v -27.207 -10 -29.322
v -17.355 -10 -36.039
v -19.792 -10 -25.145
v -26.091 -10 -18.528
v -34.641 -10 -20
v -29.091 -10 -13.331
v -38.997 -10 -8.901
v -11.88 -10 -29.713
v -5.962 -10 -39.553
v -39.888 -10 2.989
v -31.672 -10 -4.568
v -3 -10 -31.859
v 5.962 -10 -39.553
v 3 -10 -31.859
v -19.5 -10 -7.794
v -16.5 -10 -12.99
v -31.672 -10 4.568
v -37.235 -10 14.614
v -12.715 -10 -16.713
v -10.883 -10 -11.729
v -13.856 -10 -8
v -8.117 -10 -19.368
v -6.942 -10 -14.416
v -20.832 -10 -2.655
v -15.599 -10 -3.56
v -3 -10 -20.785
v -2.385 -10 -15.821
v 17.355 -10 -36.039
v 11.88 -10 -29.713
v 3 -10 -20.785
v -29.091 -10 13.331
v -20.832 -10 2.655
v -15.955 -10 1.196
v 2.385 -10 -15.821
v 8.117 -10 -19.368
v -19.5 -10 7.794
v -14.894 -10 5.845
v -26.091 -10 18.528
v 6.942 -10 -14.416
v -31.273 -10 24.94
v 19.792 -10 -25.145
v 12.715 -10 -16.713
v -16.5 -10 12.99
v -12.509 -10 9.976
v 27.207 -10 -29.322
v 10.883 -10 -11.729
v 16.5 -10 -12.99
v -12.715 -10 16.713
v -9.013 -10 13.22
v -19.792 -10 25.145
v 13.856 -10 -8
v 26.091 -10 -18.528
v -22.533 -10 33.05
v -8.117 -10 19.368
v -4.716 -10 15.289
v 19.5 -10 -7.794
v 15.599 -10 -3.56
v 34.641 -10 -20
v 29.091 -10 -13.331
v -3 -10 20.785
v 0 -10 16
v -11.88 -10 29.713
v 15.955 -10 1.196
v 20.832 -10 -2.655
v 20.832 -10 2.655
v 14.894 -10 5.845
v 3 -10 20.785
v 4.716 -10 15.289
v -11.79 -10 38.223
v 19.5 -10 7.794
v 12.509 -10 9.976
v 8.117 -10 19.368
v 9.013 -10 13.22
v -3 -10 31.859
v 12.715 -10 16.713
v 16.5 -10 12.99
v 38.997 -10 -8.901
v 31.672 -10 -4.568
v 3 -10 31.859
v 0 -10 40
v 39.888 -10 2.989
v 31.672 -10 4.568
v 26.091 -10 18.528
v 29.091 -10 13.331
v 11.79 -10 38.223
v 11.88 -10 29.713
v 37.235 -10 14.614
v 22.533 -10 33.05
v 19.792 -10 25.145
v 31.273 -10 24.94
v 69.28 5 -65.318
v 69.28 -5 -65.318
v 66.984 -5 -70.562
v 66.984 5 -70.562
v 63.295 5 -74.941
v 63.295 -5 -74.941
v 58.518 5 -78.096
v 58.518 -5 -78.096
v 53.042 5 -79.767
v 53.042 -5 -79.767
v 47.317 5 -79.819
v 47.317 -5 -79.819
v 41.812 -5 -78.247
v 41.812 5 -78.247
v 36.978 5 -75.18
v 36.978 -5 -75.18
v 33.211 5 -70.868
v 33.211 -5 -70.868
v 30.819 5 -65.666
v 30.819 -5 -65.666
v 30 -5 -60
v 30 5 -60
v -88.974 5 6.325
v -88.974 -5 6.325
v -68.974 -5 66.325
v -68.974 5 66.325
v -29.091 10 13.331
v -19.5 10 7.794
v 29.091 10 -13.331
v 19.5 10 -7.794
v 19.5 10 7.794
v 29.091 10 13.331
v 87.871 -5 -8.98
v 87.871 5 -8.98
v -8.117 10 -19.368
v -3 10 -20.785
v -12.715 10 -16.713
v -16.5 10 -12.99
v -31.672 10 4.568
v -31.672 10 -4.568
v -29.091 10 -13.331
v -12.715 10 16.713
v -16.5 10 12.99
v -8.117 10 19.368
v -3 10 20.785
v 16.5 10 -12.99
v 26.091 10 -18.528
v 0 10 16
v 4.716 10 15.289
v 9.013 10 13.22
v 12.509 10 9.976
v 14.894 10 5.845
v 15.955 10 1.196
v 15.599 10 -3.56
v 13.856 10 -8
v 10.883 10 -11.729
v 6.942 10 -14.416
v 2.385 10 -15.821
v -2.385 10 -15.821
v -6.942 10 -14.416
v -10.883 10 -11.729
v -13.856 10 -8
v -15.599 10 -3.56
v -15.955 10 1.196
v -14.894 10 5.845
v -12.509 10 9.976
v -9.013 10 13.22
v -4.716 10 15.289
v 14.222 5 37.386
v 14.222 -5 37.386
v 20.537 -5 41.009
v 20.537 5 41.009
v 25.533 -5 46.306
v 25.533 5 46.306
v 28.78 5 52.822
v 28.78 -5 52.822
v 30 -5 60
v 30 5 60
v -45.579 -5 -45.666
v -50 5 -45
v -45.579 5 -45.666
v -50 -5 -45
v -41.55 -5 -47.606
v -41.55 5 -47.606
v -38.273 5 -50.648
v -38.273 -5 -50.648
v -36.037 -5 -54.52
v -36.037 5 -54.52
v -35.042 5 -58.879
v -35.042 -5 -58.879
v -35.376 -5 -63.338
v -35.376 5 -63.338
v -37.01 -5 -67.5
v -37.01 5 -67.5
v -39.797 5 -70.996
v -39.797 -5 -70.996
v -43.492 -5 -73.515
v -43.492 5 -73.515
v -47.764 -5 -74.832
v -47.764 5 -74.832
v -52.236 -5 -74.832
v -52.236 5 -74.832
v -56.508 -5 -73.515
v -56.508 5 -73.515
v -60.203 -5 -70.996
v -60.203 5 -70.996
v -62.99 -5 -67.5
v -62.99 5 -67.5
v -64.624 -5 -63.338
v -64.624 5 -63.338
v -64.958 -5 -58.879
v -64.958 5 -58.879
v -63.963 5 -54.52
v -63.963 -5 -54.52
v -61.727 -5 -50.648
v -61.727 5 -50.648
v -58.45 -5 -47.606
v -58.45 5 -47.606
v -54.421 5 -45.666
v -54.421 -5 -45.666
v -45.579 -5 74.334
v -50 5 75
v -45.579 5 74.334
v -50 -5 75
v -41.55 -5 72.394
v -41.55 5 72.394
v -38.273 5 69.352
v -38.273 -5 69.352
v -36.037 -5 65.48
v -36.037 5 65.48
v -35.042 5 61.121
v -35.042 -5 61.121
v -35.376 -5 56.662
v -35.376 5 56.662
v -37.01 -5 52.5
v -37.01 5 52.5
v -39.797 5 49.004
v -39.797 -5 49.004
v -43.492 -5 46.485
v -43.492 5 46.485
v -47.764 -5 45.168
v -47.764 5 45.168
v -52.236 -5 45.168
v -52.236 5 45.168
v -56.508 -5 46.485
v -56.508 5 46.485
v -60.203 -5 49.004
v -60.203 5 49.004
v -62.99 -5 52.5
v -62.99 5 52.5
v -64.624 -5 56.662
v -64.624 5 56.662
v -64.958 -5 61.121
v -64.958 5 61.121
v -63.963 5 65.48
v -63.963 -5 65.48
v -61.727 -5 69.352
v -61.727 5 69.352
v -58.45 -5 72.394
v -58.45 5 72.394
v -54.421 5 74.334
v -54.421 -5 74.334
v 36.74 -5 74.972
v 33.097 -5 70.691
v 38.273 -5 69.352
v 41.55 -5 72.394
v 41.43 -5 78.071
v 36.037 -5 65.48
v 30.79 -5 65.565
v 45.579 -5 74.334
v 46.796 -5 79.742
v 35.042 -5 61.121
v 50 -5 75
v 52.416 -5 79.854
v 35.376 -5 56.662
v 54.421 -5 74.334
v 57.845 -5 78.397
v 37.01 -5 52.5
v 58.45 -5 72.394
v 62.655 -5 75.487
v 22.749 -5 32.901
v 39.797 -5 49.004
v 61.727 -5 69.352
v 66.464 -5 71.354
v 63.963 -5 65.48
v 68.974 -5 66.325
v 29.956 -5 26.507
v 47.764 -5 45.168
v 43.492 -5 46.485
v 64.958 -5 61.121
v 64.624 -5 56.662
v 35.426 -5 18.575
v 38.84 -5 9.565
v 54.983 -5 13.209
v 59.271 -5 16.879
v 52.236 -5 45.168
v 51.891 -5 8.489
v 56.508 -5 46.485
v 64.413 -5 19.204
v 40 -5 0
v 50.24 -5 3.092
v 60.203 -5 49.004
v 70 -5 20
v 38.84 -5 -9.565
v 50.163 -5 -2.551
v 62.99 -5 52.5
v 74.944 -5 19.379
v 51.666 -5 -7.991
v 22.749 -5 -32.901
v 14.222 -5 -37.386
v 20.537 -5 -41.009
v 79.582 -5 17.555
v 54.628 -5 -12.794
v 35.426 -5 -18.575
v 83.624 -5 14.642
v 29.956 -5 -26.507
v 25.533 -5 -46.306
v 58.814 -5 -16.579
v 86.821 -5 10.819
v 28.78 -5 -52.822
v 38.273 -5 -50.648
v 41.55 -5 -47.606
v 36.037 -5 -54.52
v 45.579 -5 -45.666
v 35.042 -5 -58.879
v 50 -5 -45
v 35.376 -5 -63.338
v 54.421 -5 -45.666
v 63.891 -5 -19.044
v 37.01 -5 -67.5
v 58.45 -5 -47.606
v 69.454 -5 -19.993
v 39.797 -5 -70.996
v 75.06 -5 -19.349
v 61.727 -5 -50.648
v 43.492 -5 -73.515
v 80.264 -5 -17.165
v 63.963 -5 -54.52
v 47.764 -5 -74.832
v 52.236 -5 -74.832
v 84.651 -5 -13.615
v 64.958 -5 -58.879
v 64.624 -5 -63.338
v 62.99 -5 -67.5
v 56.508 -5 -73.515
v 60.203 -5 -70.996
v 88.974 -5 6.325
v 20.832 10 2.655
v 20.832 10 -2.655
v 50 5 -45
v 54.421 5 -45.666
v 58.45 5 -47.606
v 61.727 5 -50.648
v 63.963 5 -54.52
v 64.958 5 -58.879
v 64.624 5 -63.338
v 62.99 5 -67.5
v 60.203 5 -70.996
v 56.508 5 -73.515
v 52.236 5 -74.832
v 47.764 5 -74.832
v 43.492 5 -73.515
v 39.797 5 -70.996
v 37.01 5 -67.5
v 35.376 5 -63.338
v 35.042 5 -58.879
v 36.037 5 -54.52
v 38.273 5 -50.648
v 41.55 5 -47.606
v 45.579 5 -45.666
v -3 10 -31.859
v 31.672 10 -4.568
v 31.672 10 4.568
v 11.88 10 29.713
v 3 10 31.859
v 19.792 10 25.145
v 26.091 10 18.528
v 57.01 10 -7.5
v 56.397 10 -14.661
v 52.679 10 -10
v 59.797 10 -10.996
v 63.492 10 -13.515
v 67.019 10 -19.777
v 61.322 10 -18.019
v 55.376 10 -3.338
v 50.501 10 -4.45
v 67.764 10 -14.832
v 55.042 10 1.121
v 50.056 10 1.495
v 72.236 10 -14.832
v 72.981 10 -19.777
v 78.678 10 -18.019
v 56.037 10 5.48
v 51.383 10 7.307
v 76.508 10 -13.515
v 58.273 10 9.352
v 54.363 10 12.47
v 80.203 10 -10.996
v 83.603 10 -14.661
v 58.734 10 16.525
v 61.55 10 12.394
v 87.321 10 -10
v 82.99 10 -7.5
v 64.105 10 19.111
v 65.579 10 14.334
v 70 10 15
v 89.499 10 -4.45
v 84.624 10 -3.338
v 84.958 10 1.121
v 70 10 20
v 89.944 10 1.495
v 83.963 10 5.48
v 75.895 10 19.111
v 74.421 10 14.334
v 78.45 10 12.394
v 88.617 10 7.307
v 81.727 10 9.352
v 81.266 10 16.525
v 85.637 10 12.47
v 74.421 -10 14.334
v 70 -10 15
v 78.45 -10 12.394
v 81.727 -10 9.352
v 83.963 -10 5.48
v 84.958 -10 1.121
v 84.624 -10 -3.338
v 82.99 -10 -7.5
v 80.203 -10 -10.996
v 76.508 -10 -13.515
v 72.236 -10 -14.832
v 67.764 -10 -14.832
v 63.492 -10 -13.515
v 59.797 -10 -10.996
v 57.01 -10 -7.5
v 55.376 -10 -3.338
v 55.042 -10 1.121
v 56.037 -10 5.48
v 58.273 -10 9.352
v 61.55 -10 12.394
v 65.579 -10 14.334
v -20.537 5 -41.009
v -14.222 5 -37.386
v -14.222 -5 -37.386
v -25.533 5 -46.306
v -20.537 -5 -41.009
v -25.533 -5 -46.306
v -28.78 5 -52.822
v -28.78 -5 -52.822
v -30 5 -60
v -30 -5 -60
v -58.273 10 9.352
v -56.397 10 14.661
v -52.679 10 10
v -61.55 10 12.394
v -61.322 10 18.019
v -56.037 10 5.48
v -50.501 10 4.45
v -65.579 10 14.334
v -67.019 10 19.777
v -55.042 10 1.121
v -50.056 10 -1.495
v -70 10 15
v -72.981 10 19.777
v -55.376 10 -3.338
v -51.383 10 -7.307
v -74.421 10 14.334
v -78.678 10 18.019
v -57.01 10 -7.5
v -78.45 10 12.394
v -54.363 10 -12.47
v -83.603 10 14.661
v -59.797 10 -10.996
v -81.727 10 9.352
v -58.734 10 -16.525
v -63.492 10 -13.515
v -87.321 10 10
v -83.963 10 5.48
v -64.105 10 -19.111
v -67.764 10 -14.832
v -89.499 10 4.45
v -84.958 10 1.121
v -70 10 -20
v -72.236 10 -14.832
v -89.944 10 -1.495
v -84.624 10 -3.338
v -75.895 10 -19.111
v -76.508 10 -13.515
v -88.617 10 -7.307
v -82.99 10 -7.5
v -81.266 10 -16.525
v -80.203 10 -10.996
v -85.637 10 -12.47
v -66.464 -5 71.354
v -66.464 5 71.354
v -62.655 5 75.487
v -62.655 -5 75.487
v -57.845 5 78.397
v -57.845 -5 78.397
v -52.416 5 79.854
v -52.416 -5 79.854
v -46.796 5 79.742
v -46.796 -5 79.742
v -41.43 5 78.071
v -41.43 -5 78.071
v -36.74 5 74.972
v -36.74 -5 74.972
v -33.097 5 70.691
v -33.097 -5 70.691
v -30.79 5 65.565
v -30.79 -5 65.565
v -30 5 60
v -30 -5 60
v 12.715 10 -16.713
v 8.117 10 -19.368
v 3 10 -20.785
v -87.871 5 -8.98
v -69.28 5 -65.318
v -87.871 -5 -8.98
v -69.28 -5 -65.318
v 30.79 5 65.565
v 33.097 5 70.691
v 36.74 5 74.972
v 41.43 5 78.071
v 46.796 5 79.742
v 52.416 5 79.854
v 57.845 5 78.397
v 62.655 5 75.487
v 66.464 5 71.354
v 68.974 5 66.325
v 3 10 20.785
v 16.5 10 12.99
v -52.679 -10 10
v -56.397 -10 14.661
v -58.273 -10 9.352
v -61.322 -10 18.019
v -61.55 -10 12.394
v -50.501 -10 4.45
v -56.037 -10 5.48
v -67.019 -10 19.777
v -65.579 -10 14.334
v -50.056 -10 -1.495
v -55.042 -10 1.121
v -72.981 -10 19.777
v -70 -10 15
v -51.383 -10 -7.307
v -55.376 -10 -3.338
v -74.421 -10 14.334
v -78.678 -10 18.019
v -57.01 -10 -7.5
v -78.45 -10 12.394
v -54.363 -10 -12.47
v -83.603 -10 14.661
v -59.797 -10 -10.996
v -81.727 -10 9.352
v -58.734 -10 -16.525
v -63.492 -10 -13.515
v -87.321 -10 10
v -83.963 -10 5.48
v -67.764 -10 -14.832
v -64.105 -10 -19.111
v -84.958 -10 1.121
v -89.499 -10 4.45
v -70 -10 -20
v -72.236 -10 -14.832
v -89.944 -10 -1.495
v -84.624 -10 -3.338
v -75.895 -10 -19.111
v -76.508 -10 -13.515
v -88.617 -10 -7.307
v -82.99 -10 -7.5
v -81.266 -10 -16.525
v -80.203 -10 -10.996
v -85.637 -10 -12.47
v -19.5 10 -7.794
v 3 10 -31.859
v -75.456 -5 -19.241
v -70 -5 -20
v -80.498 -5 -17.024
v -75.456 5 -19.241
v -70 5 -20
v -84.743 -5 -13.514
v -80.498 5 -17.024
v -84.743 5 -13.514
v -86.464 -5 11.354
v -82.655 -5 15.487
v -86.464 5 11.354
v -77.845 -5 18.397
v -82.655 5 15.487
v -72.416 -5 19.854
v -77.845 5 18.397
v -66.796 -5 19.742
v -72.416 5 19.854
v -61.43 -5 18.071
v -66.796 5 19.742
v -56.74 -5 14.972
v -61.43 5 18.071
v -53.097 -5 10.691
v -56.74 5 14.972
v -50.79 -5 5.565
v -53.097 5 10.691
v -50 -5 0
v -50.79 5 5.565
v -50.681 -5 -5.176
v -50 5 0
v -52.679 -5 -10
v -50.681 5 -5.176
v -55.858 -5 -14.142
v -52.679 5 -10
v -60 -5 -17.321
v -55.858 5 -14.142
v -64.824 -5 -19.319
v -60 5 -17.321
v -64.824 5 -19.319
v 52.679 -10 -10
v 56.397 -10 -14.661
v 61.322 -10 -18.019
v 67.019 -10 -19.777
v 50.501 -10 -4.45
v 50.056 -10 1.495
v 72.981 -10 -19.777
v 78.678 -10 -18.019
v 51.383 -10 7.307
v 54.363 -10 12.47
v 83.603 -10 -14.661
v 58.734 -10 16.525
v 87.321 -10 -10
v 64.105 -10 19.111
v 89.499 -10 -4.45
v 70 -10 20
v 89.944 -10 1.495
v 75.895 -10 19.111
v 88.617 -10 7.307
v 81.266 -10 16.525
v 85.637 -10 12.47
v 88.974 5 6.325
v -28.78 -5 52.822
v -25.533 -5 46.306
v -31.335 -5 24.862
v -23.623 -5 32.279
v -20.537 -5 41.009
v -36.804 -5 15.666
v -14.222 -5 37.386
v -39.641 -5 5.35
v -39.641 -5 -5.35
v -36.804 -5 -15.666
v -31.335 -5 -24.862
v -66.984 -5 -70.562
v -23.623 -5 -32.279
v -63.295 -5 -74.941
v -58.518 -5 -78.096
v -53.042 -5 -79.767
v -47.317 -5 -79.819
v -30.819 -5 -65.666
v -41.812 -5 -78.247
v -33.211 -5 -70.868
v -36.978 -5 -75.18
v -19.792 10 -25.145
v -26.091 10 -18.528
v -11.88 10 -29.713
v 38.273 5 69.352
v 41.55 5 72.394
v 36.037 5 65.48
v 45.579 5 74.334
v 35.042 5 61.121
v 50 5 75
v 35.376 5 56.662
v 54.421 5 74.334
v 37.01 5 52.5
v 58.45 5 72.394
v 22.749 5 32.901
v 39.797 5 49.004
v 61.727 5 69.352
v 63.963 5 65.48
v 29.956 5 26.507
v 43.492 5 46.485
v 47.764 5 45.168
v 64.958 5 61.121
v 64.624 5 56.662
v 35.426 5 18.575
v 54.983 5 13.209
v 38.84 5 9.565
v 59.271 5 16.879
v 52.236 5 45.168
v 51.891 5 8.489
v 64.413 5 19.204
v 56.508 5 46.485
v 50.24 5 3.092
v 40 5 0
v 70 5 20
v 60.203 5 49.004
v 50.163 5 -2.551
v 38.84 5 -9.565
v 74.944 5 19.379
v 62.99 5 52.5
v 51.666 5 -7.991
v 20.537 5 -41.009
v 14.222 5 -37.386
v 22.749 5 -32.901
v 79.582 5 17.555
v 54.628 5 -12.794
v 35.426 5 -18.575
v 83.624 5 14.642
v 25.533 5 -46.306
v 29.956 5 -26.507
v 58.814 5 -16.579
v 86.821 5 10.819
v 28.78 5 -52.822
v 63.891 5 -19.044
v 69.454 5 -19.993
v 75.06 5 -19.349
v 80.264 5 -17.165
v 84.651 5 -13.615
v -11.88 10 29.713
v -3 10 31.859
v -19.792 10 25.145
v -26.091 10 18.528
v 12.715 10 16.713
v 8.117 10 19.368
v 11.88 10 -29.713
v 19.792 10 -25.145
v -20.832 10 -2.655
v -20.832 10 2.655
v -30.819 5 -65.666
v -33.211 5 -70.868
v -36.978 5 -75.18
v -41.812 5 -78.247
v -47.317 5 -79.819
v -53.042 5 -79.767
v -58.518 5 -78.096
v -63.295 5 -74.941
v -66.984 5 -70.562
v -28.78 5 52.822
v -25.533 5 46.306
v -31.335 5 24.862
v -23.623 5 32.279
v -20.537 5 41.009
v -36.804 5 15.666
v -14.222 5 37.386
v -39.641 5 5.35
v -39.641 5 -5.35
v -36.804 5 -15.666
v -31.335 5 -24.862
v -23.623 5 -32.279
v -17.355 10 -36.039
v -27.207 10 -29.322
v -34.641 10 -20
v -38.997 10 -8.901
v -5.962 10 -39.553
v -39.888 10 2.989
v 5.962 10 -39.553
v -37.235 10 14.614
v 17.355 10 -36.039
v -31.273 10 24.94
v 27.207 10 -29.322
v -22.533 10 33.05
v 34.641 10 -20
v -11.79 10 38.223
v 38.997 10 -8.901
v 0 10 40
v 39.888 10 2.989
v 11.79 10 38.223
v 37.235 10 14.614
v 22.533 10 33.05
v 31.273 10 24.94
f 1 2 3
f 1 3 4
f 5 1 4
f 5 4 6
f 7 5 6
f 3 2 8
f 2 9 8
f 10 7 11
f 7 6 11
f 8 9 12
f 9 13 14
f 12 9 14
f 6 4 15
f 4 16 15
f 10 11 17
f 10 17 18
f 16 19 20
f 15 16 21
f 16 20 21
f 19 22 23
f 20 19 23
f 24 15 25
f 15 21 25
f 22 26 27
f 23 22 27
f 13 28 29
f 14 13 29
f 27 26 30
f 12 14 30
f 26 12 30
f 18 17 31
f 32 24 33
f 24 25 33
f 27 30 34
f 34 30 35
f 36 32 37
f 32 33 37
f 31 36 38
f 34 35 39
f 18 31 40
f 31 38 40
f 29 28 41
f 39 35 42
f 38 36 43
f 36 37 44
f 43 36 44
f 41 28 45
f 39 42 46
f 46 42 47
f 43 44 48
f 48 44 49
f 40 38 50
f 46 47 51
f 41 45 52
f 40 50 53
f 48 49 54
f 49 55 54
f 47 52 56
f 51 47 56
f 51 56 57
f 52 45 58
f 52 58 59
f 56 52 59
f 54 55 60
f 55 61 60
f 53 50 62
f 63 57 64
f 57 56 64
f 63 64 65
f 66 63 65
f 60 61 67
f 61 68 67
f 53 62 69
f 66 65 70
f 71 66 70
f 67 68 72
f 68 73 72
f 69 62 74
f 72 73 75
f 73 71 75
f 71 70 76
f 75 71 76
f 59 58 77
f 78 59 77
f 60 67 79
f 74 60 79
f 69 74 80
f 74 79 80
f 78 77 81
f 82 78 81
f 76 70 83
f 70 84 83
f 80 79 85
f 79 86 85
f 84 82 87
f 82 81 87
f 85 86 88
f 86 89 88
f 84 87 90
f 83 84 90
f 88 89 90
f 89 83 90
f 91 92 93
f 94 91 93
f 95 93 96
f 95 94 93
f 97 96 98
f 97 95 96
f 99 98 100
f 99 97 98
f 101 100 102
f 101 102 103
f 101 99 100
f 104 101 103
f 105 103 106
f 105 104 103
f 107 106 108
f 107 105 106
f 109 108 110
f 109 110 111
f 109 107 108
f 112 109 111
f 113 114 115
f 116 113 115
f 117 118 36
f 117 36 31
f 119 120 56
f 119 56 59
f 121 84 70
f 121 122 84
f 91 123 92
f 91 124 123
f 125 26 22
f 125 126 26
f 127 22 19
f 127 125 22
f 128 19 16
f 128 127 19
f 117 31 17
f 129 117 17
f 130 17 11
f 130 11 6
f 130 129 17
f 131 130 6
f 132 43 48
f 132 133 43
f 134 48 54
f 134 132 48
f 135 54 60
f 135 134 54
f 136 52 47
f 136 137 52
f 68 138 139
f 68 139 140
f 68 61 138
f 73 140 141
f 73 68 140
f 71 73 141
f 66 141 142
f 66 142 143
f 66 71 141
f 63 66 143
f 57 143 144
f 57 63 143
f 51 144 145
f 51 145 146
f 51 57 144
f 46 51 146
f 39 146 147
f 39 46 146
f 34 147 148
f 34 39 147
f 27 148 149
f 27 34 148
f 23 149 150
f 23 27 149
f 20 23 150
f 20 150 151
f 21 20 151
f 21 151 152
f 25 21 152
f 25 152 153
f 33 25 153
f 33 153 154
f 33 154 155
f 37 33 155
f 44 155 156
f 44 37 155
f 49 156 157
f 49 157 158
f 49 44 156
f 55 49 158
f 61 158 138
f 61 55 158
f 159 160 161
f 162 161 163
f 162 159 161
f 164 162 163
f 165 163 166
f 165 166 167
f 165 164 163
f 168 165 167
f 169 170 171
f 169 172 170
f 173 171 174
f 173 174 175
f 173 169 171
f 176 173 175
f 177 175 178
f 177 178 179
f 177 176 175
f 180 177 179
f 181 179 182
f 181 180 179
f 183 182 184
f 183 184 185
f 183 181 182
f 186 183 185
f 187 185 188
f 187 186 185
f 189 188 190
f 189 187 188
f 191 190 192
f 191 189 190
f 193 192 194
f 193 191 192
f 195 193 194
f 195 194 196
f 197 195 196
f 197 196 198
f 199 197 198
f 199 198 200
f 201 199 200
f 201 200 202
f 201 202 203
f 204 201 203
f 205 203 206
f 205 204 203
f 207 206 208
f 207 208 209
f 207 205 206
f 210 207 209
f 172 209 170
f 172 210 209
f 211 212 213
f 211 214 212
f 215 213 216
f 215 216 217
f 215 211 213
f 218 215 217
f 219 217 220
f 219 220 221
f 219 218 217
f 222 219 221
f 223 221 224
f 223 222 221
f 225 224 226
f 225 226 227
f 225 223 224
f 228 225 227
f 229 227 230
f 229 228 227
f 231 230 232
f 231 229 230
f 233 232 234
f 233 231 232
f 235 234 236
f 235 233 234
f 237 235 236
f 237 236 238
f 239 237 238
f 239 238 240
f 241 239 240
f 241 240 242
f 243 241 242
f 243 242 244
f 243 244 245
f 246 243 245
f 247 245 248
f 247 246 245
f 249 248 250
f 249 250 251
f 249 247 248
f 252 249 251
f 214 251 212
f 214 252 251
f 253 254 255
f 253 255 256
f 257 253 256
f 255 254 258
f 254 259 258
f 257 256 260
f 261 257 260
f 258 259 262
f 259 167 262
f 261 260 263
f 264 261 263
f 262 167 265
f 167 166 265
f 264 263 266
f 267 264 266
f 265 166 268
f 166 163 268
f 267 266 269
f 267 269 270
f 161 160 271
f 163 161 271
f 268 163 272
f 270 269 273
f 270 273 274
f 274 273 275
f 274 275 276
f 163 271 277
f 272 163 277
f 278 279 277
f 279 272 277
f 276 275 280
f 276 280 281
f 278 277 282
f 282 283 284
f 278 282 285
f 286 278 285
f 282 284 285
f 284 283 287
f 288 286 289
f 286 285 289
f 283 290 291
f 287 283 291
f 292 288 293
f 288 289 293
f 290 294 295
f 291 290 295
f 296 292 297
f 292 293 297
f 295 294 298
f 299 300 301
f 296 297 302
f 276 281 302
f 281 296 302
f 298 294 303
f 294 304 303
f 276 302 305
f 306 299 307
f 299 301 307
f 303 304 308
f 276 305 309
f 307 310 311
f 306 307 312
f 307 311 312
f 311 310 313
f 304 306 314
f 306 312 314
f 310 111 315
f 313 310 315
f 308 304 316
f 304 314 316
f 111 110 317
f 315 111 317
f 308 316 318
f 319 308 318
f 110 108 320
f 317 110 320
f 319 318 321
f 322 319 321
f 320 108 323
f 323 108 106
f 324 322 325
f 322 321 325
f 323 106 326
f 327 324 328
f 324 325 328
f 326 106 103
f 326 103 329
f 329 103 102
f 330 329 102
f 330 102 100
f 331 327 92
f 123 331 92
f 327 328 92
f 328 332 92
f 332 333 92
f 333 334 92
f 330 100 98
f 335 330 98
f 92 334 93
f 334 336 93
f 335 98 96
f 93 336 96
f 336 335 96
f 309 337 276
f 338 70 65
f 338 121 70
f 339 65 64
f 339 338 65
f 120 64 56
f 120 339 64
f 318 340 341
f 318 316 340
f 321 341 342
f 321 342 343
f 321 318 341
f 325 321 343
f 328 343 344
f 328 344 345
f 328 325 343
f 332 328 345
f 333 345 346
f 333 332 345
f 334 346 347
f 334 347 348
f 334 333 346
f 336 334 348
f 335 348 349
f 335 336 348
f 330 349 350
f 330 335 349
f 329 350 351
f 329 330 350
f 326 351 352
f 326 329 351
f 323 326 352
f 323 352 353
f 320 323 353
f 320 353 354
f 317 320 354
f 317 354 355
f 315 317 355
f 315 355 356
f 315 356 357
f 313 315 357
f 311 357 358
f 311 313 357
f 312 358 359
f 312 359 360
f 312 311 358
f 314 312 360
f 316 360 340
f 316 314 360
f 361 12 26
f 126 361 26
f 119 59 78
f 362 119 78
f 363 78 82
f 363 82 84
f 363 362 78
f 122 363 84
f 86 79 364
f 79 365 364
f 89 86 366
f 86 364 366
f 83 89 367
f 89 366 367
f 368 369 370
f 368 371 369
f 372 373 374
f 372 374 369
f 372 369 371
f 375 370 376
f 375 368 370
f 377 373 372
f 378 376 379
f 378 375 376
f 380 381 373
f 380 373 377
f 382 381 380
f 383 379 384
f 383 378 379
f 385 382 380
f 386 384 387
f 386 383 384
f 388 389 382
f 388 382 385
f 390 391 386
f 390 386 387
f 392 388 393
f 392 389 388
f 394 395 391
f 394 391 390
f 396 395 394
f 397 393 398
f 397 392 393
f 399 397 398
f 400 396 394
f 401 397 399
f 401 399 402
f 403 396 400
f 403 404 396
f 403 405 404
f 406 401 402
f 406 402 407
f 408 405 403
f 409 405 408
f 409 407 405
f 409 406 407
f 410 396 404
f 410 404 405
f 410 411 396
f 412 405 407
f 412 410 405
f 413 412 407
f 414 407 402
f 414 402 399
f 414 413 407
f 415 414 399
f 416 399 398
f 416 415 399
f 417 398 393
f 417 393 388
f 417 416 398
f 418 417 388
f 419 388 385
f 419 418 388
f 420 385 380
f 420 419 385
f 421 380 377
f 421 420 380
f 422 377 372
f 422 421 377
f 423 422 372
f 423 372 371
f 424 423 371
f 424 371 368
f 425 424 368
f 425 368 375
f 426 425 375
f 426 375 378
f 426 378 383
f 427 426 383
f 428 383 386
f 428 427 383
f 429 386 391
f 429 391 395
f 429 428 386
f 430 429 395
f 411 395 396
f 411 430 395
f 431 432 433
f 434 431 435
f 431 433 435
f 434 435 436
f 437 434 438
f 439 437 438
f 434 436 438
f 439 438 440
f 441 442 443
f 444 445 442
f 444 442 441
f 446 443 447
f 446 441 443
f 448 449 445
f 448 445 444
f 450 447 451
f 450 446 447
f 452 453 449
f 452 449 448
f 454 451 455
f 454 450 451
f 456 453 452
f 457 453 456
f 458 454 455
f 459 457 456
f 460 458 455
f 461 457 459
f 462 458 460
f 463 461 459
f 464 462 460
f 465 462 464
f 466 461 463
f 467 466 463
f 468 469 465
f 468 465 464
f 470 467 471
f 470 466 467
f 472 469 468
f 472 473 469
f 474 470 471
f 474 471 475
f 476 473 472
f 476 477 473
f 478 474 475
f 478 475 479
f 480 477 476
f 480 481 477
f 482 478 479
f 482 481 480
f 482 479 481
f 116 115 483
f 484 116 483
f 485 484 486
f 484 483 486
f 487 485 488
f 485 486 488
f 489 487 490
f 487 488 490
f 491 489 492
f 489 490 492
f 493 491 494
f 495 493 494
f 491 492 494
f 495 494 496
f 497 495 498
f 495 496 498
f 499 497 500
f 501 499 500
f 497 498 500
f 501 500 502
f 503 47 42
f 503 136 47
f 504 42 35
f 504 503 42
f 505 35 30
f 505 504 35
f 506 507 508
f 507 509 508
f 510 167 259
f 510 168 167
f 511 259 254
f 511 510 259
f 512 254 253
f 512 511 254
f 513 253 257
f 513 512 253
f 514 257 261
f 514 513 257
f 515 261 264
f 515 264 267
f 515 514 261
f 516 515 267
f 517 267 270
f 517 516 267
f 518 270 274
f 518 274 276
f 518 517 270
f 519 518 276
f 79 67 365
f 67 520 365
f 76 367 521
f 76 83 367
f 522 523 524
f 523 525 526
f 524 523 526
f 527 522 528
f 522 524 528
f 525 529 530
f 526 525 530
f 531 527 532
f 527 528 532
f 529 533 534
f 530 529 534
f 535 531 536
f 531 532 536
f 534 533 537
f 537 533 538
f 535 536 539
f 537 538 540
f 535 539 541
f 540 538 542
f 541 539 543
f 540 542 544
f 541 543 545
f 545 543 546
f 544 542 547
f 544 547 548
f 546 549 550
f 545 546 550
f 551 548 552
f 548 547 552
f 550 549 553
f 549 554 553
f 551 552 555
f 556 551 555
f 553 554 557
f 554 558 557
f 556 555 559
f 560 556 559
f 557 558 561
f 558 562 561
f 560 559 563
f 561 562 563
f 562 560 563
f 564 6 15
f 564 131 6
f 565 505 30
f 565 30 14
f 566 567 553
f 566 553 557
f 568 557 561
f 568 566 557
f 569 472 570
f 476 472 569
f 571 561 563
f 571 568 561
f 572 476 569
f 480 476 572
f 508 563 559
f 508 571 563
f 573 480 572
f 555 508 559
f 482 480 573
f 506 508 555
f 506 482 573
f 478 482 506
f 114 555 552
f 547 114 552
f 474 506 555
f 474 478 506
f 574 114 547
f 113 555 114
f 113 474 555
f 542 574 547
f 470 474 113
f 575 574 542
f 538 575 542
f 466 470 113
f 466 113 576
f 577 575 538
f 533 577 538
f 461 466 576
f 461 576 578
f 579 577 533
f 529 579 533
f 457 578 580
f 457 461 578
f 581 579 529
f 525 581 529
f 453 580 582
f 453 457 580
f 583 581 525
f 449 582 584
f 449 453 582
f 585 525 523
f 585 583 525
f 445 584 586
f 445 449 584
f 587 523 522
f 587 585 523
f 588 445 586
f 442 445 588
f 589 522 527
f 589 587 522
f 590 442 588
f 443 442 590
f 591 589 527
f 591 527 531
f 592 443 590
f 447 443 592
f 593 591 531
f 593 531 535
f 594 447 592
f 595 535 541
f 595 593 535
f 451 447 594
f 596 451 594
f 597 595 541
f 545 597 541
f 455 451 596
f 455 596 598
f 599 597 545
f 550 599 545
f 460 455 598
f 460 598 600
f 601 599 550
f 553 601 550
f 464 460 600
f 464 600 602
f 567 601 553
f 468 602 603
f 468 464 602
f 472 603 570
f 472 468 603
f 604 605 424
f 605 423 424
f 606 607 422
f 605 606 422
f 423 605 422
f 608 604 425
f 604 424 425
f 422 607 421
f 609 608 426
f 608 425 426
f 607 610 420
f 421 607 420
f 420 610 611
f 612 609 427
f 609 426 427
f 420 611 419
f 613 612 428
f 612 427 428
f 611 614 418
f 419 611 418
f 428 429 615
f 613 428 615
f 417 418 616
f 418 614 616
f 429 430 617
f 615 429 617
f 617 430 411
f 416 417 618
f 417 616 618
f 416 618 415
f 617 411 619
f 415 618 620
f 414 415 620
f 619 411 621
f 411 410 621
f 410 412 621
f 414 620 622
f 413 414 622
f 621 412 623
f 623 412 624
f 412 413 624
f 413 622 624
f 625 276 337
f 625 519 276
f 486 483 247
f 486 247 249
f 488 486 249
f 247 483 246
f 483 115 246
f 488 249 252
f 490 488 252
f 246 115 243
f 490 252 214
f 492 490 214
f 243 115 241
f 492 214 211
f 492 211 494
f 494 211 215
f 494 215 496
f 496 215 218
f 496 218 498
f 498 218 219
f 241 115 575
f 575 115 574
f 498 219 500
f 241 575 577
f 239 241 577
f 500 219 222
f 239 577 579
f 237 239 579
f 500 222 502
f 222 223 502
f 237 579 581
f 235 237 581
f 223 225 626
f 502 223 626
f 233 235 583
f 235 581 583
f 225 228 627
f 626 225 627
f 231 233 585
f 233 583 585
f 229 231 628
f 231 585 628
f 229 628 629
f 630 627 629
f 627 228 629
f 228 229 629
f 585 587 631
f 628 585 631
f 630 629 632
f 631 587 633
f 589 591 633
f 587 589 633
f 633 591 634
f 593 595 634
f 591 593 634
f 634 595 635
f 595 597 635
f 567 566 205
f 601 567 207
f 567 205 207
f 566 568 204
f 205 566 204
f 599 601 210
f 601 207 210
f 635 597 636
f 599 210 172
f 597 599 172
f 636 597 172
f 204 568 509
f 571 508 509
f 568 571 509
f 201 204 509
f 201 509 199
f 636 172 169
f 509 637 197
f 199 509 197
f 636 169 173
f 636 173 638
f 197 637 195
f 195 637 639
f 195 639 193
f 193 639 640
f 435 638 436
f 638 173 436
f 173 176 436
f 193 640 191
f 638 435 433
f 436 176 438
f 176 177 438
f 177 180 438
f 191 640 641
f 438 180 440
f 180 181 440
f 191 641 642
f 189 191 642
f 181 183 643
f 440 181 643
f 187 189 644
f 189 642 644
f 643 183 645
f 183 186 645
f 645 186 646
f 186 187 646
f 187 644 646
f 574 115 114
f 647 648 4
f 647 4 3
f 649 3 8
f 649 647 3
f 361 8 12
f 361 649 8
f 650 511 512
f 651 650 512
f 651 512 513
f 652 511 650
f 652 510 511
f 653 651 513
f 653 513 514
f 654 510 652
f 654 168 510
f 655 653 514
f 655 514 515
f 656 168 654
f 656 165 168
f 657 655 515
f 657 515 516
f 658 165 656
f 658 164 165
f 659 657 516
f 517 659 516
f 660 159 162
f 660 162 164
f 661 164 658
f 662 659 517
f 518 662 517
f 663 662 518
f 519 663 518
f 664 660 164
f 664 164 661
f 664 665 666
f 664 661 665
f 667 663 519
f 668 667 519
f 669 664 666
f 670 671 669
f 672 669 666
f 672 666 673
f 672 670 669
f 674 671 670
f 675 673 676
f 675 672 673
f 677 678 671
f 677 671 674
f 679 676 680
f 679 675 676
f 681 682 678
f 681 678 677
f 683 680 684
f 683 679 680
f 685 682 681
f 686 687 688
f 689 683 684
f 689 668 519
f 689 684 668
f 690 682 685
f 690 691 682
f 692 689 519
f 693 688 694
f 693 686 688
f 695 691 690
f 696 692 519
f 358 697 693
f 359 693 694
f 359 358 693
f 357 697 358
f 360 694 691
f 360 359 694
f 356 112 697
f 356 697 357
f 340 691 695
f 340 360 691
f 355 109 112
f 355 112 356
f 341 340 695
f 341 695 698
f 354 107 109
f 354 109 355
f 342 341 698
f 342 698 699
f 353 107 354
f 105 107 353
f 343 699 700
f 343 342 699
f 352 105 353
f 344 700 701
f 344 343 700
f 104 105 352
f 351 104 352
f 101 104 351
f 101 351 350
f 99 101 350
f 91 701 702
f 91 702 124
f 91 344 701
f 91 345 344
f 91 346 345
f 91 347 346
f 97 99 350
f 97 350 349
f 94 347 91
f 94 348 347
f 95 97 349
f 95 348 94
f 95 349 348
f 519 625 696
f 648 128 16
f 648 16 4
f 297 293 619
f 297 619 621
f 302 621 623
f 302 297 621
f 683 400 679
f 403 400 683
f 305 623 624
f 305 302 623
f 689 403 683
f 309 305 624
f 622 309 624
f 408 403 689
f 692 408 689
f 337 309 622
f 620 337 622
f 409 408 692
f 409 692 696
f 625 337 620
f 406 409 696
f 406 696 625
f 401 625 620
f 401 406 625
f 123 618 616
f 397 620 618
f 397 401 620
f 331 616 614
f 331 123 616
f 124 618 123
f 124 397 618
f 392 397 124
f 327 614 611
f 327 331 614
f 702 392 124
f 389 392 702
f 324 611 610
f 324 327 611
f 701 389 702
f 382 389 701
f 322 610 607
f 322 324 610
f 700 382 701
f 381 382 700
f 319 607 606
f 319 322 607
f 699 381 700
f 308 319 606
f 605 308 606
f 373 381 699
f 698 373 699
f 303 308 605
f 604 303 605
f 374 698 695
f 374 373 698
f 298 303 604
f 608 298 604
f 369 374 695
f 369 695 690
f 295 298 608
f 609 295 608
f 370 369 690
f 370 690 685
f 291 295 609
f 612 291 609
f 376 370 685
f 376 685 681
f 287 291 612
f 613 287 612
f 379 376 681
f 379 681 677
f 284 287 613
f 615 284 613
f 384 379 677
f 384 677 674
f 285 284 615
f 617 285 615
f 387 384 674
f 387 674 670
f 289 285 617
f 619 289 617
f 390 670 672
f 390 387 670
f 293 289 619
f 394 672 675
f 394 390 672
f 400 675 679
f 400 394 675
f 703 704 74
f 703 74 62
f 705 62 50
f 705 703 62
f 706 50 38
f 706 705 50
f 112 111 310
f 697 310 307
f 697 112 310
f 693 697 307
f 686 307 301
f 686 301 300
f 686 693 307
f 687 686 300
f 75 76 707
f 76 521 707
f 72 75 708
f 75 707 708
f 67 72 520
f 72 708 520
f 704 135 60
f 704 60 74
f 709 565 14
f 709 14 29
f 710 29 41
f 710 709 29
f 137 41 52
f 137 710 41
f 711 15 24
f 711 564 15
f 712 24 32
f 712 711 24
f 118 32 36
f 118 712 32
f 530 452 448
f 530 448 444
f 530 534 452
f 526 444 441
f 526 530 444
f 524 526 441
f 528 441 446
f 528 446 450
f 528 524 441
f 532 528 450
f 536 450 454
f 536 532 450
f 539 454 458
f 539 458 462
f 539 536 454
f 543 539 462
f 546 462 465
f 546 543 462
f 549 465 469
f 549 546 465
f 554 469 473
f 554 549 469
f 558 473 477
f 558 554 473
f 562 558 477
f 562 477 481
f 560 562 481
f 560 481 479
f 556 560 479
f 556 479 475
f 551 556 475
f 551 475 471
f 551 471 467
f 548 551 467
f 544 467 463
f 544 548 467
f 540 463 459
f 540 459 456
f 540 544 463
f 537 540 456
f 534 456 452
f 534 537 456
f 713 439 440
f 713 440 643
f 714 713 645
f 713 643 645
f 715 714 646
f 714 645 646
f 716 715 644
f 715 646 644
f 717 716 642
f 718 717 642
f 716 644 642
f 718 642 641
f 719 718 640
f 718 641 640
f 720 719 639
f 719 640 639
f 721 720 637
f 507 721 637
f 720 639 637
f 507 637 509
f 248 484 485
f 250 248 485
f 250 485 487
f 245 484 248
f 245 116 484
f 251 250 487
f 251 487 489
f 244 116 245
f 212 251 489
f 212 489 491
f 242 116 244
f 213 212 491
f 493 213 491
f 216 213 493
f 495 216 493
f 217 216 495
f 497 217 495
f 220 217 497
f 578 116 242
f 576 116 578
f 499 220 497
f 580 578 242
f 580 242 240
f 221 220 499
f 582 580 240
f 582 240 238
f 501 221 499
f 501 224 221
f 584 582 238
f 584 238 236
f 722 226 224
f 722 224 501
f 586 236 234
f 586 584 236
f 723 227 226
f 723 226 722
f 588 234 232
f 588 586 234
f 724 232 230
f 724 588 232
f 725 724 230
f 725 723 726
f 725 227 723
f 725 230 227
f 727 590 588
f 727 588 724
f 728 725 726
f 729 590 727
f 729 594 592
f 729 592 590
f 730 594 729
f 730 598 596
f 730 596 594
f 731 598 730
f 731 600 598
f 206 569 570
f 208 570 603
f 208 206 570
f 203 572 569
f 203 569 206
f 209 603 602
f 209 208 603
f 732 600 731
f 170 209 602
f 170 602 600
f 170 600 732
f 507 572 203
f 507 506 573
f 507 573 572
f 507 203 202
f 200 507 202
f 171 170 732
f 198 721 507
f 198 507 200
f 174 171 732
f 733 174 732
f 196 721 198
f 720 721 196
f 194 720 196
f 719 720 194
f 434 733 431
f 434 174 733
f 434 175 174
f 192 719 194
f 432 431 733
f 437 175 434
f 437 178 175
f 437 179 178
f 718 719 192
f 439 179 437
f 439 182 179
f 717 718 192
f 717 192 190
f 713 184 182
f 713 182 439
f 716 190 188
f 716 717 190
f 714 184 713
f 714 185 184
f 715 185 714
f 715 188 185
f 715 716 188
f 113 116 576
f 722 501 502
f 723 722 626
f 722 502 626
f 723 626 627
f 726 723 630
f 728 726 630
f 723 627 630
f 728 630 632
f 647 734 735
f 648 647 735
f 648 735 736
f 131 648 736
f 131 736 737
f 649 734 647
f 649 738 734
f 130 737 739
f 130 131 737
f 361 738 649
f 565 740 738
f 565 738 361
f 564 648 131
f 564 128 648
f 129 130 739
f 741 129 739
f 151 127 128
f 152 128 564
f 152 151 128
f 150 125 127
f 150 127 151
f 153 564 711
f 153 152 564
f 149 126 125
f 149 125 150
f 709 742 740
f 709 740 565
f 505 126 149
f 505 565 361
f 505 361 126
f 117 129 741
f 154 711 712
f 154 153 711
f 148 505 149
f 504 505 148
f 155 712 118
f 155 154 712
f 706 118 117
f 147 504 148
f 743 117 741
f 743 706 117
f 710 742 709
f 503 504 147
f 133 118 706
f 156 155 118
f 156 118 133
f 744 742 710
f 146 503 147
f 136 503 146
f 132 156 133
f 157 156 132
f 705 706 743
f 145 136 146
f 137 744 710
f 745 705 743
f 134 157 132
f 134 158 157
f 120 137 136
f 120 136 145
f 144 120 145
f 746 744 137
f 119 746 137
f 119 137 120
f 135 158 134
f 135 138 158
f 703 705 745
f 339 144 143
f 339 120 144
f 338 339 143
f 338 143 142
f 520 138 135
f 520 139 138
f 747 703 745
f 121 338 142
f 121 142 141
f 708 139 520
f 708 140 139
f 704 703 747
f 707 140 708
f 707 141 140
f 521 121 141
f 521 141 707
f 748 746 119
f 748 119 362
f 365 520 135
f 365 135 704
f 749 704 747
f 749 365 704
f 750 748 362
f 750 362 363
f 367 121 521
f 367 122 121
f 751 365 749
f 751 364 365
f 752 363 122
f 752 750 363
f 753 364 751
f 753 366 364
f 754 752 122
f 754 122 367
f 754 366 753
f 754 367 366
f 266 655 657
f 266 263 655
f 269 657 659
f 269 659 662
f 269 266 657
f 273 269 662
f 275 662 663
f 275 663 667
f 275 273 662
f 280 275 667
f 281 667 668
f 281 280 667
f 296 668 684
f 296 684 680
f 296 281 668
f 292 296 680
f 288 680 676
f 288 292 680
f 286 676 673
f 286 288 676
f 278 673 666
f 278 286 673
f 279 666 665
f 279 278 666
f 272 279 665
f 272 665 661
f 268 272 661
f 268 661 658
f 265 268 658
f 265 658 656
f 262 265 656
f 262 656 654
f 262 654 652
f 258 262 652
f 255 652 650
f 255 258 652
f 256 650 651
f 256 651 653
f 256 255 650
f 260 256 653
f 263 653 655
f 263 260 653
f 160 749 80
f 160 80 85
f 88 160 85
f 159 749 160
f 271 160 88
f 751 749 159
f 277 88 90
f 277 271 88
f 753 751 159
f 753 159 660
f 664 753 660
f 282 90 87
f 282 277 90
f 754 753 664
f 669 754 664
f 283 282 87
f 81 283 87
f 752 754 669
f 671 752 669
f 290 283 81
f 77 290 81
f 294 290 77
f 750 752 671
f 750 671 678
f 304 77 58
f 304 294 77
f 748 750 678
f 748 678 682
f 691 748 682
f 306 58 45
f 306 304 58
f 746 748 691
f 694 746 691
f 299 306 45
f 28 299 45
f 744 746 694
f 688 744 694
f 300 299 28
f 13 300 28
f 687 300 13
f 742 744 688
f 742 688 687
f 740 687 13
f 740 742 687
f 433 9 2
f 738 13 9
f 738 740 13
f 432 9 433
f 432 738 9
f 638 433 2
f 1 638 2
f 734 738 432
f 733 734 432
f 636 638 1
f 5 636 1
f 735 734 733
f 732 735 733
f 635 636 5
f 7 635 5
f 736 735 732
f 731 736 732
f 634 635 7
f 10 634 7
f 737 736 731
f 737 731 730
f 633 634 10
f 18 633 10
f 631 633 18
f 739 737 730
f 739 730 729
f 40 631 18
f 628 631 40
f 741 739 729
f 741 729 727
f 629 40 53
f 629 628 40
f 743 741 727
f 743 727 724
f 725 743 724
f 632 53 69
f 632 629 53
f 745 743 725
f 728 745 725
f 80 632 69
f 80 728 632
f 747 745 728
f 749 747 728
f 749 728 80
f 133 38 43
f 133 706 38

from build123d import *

# Parameters (mm, degrees)
SKETCH1_R             = 20
SKETCH1_R_2           = 15
BOSS_EXTRUDE4_DEPTH   = 10
SKETCH1_R_3           = 40
SKETCH1_R_4           = 16
BOSS_EXTRUDE4_2_DEPTH = 10
BOSS_EXTRUDE4_3_DEPTH = 10
SKETCH1_7_R           = 15
BOSS_EXTRUDE5_DEPTH   = 5


with BuildPart() as part:
    # Sketch1 → Boss-Extrude4 (new, symmetric)
    with BuildSketch(Plane(origin=(0, 0, 0), x_dir=(1, 0, 0), z_dir=(0, 1, 0))):
        with Locations((70, 0)):
            Circle(SKETCH1_R)
        with Locations((70, 0)):
            Circle(SKETCH1_R_2, mode=Mode.SUBTRACT)
    extrude(amount=BOSS_EXTRUDE4_DEPTH, both=True)



with BuildPart() as body_2:
    # Sketch1 → Boss-Extrude4 2 (new, symmetric)
    with BuildSketch(Plane(origin=(0, 0, 0), x_dir=(1, 0, 0), z_dir=(0, 1, 0))):
        Circle(SKETCH1_R_3)
        with BuildLine():
            ThreePointArc((-16.5, -12.990381057), (-10.5, -18.186533479), (-3, -20.784609691))
            Line((-3, -20.784609691), (-3, -31.859064644))
            ThreePointArc((-3, -31.859064644), (-16, -27.712812921), (-26.090759323, -18.527608533))
            Line((-26.090759323, -18.527608533), (-16.5, -12.990381057))
        make_face(mode=Mode.SUBTRACT)
        with BuildLine():
            Line((3, -31.859064644), (3, -20.784609691))
            ThreePointArc((3, -20.784609691), (10.5, -18.186533479), (16.5, -12.990381057))
            Line((16.5, -12.990381057), (26.090759323, -18.527608533))
            ThreePointArc((26.090759323, -18.527608533), (16, -27.712812921), (3, -31.859064644))
        make_face(mode=Mode.SUBTRACT)
        with BuildLine():
            ThreePointArc((19.5, -7.794228634), (21, 0), (19.5, 7.794228634))
            Line((19.5, 7.794228634), (29.090759323, 13.331456111))
            ThreePointArc((29.090759323, 13.331456111), (32, 0), (29.090759323, -13.331456111))
            Line((29.090759323, -13.331456111), (19.5, -7.794228634))
        make_face(mode=Mode.SUBTRACT)
        with BuildLine():
            ThreePointArc((-19.5, 7.794228634), (-21, 0), (-19.5, -7.794228634))
            Line((-19.5, -7.794228634), (-29.090759323, -13.331456111))
            ThreePointArc((-29.090759323, -13.331456111), (-32, 0), (-29.090759323, 13.331456111))
            Line((-29.090759323, 13.331456111), (-19.5, 7.794228634))
        make_face(mode=Mode.SUBTRACT)
        with BuildLine():
            ThreePointArc((-3, 20.784609691), (-10.5, 18.186533479), (-16.5, 12.990381057))
            Line((-16.5, 12.990381057), (-26.090759323, 18.527608533))
            ThreePointArc((-26.090759323, 18.527608533), (-16, 27.712812921), (-3, 31.859064644))
            Line((-3, 31.859064644), (-3, 20.784609691))
        make_face(mode=Mode.SUBTRACT)
        Circle(SKETCH1_R_4, mode=Mode.SUBTRACT)
        with BuildLine():
            ThreePointArc((16.5, 12.990381057), (10.5, 18.186533479), (3, 20.784609691))
            Line((3, 20.784609691), (3, 31.859064644))
            ThreePointArc((3, 31.859064644), (16, 27.712812921), (26.090759323, 18.527608533))
            Line((26.090759323, 18.527608533), (16.5, 12.990381057))
        make_face(mode=Mode.SUBTRACT)
    extrude(amount=BOSS_EXTRUDE4_2_DEPTH, both=True)


with BuildPart() as body_3:
    # Sketch1 → Boss-Extrude4 3 (new, symmetric)
    with BuildSketch(Plane(origin=(0, 0, 0), x_dir=(1, 0, 0), z_dir=(0, 1, 0))):
        with Locations((-70, 0)):
            Circle(SKETCH1_R)
        with Locations((-70, 0)):
            Circle(SKETCH1_R_2, mode=Mode.SUBTRACT)
    extrude(amount=BOSS_EXTRUDE4_3_DEPTH, both=True)


with BuildPart() as part_1:
    add(part.part)

    add(body_2.part)  # Boss-Extrude5 merges body 2

    add(body_3.part)  # Boss-Extrude5 merges body 3
    # Sketch1<7> → Boss-Extrude5 (add, symmetric)
    # profile 1 of 2: a face of its own
    with BuildSketch(Plane(origin=(0, 0, 0), x_dir=(1, 0, 0), z_dir=(0, 1, 0))):
        with BuildLine():
            Line((87.870632354, 8.980005528), (69.28006665, 65.317803116))
            ThreePointArc((69.28006665, 65.317803116), (47.316842625, 79.819199441), (30, 60))
            ThreePointArc((30, 60), (25.532838196, 46.305506483), (14.221544564, 37.38646373))
            ThreePointArc((14.221544564, 37.38646373), (40, 0), (14.221544564, -37.38646373))
            ThreePointArc((14.221544564, -37.38646373), (25.532838196, -46.305506483), (30, -60))
            ThreePointArc((30, -60), (46.79635514, -79.741749153), (68.973665961, -66.32455532))
            Line((68.973665961, -66.32455532), (88.973665961, -6.32455532))
            ThreePointArc((88.973665961, -6.32455532), (50.051742551, -1.437715109), (87.870632354, 8.980005528))
        make_face()
        with Locations((50, -60)):
            Circle(SKETCH1_7_R, mode=Mode.SUBTRACT)
        with Locations((50, 60)):
            Circle(SKETCH1_7_R, mode=Mode.SUBTRACT)
    # profile 2 of 2: a face of its own
    with BuildSketch(Plane(origin=(0, 0, 0), x_dir=(1, 0, 0), z_dir=(0, 1, 0))):
        with BuildLine():
            ThreePointArc((-14.221544564, -37.38646373), (-40, 0), (-14.221544564, 37.38646373))
            ThreePointArc((-14.221544564, 37.38646373), (-25.532838196, 46.305506483), (-30, 60))
            ThreePointArc((-30, 60), (-47.316842625, 79.819199441), (-69.28006665, 65.317803116))
            Line((-69.28006665, 65.317803116), (-87.870632354, 8.980005528))
            ThreePointArc((-87.870632354, 8.980005528), (-50.051742551, -1.437715109), (-88.973665961, -6.32455532))
            Line((-88.973665961, -6.32455532), (-68.973665961, -66.32455532))
            ThreePointArc((-68.973665961, -66.32455532), (-46.79635514, -79.741749153), (-30, -60))
            ThreePointArc((-30, -60), (-25.532838196, -46.305506483), (-14.221544564, -37.38646373))
        make_face()
        with Locations((-50, -60)):
            Circle(SKETCH1_7_R, mode=Mode.SUBTRACT)
        with Locations((-50, 60)):
            Circle(SKETCH1_7_R, mode=Mode.SUBTRACT)
    extrude(amount=BOSS_EXTRUDE5_DEPTH, both=True)


solid = part_1.part
